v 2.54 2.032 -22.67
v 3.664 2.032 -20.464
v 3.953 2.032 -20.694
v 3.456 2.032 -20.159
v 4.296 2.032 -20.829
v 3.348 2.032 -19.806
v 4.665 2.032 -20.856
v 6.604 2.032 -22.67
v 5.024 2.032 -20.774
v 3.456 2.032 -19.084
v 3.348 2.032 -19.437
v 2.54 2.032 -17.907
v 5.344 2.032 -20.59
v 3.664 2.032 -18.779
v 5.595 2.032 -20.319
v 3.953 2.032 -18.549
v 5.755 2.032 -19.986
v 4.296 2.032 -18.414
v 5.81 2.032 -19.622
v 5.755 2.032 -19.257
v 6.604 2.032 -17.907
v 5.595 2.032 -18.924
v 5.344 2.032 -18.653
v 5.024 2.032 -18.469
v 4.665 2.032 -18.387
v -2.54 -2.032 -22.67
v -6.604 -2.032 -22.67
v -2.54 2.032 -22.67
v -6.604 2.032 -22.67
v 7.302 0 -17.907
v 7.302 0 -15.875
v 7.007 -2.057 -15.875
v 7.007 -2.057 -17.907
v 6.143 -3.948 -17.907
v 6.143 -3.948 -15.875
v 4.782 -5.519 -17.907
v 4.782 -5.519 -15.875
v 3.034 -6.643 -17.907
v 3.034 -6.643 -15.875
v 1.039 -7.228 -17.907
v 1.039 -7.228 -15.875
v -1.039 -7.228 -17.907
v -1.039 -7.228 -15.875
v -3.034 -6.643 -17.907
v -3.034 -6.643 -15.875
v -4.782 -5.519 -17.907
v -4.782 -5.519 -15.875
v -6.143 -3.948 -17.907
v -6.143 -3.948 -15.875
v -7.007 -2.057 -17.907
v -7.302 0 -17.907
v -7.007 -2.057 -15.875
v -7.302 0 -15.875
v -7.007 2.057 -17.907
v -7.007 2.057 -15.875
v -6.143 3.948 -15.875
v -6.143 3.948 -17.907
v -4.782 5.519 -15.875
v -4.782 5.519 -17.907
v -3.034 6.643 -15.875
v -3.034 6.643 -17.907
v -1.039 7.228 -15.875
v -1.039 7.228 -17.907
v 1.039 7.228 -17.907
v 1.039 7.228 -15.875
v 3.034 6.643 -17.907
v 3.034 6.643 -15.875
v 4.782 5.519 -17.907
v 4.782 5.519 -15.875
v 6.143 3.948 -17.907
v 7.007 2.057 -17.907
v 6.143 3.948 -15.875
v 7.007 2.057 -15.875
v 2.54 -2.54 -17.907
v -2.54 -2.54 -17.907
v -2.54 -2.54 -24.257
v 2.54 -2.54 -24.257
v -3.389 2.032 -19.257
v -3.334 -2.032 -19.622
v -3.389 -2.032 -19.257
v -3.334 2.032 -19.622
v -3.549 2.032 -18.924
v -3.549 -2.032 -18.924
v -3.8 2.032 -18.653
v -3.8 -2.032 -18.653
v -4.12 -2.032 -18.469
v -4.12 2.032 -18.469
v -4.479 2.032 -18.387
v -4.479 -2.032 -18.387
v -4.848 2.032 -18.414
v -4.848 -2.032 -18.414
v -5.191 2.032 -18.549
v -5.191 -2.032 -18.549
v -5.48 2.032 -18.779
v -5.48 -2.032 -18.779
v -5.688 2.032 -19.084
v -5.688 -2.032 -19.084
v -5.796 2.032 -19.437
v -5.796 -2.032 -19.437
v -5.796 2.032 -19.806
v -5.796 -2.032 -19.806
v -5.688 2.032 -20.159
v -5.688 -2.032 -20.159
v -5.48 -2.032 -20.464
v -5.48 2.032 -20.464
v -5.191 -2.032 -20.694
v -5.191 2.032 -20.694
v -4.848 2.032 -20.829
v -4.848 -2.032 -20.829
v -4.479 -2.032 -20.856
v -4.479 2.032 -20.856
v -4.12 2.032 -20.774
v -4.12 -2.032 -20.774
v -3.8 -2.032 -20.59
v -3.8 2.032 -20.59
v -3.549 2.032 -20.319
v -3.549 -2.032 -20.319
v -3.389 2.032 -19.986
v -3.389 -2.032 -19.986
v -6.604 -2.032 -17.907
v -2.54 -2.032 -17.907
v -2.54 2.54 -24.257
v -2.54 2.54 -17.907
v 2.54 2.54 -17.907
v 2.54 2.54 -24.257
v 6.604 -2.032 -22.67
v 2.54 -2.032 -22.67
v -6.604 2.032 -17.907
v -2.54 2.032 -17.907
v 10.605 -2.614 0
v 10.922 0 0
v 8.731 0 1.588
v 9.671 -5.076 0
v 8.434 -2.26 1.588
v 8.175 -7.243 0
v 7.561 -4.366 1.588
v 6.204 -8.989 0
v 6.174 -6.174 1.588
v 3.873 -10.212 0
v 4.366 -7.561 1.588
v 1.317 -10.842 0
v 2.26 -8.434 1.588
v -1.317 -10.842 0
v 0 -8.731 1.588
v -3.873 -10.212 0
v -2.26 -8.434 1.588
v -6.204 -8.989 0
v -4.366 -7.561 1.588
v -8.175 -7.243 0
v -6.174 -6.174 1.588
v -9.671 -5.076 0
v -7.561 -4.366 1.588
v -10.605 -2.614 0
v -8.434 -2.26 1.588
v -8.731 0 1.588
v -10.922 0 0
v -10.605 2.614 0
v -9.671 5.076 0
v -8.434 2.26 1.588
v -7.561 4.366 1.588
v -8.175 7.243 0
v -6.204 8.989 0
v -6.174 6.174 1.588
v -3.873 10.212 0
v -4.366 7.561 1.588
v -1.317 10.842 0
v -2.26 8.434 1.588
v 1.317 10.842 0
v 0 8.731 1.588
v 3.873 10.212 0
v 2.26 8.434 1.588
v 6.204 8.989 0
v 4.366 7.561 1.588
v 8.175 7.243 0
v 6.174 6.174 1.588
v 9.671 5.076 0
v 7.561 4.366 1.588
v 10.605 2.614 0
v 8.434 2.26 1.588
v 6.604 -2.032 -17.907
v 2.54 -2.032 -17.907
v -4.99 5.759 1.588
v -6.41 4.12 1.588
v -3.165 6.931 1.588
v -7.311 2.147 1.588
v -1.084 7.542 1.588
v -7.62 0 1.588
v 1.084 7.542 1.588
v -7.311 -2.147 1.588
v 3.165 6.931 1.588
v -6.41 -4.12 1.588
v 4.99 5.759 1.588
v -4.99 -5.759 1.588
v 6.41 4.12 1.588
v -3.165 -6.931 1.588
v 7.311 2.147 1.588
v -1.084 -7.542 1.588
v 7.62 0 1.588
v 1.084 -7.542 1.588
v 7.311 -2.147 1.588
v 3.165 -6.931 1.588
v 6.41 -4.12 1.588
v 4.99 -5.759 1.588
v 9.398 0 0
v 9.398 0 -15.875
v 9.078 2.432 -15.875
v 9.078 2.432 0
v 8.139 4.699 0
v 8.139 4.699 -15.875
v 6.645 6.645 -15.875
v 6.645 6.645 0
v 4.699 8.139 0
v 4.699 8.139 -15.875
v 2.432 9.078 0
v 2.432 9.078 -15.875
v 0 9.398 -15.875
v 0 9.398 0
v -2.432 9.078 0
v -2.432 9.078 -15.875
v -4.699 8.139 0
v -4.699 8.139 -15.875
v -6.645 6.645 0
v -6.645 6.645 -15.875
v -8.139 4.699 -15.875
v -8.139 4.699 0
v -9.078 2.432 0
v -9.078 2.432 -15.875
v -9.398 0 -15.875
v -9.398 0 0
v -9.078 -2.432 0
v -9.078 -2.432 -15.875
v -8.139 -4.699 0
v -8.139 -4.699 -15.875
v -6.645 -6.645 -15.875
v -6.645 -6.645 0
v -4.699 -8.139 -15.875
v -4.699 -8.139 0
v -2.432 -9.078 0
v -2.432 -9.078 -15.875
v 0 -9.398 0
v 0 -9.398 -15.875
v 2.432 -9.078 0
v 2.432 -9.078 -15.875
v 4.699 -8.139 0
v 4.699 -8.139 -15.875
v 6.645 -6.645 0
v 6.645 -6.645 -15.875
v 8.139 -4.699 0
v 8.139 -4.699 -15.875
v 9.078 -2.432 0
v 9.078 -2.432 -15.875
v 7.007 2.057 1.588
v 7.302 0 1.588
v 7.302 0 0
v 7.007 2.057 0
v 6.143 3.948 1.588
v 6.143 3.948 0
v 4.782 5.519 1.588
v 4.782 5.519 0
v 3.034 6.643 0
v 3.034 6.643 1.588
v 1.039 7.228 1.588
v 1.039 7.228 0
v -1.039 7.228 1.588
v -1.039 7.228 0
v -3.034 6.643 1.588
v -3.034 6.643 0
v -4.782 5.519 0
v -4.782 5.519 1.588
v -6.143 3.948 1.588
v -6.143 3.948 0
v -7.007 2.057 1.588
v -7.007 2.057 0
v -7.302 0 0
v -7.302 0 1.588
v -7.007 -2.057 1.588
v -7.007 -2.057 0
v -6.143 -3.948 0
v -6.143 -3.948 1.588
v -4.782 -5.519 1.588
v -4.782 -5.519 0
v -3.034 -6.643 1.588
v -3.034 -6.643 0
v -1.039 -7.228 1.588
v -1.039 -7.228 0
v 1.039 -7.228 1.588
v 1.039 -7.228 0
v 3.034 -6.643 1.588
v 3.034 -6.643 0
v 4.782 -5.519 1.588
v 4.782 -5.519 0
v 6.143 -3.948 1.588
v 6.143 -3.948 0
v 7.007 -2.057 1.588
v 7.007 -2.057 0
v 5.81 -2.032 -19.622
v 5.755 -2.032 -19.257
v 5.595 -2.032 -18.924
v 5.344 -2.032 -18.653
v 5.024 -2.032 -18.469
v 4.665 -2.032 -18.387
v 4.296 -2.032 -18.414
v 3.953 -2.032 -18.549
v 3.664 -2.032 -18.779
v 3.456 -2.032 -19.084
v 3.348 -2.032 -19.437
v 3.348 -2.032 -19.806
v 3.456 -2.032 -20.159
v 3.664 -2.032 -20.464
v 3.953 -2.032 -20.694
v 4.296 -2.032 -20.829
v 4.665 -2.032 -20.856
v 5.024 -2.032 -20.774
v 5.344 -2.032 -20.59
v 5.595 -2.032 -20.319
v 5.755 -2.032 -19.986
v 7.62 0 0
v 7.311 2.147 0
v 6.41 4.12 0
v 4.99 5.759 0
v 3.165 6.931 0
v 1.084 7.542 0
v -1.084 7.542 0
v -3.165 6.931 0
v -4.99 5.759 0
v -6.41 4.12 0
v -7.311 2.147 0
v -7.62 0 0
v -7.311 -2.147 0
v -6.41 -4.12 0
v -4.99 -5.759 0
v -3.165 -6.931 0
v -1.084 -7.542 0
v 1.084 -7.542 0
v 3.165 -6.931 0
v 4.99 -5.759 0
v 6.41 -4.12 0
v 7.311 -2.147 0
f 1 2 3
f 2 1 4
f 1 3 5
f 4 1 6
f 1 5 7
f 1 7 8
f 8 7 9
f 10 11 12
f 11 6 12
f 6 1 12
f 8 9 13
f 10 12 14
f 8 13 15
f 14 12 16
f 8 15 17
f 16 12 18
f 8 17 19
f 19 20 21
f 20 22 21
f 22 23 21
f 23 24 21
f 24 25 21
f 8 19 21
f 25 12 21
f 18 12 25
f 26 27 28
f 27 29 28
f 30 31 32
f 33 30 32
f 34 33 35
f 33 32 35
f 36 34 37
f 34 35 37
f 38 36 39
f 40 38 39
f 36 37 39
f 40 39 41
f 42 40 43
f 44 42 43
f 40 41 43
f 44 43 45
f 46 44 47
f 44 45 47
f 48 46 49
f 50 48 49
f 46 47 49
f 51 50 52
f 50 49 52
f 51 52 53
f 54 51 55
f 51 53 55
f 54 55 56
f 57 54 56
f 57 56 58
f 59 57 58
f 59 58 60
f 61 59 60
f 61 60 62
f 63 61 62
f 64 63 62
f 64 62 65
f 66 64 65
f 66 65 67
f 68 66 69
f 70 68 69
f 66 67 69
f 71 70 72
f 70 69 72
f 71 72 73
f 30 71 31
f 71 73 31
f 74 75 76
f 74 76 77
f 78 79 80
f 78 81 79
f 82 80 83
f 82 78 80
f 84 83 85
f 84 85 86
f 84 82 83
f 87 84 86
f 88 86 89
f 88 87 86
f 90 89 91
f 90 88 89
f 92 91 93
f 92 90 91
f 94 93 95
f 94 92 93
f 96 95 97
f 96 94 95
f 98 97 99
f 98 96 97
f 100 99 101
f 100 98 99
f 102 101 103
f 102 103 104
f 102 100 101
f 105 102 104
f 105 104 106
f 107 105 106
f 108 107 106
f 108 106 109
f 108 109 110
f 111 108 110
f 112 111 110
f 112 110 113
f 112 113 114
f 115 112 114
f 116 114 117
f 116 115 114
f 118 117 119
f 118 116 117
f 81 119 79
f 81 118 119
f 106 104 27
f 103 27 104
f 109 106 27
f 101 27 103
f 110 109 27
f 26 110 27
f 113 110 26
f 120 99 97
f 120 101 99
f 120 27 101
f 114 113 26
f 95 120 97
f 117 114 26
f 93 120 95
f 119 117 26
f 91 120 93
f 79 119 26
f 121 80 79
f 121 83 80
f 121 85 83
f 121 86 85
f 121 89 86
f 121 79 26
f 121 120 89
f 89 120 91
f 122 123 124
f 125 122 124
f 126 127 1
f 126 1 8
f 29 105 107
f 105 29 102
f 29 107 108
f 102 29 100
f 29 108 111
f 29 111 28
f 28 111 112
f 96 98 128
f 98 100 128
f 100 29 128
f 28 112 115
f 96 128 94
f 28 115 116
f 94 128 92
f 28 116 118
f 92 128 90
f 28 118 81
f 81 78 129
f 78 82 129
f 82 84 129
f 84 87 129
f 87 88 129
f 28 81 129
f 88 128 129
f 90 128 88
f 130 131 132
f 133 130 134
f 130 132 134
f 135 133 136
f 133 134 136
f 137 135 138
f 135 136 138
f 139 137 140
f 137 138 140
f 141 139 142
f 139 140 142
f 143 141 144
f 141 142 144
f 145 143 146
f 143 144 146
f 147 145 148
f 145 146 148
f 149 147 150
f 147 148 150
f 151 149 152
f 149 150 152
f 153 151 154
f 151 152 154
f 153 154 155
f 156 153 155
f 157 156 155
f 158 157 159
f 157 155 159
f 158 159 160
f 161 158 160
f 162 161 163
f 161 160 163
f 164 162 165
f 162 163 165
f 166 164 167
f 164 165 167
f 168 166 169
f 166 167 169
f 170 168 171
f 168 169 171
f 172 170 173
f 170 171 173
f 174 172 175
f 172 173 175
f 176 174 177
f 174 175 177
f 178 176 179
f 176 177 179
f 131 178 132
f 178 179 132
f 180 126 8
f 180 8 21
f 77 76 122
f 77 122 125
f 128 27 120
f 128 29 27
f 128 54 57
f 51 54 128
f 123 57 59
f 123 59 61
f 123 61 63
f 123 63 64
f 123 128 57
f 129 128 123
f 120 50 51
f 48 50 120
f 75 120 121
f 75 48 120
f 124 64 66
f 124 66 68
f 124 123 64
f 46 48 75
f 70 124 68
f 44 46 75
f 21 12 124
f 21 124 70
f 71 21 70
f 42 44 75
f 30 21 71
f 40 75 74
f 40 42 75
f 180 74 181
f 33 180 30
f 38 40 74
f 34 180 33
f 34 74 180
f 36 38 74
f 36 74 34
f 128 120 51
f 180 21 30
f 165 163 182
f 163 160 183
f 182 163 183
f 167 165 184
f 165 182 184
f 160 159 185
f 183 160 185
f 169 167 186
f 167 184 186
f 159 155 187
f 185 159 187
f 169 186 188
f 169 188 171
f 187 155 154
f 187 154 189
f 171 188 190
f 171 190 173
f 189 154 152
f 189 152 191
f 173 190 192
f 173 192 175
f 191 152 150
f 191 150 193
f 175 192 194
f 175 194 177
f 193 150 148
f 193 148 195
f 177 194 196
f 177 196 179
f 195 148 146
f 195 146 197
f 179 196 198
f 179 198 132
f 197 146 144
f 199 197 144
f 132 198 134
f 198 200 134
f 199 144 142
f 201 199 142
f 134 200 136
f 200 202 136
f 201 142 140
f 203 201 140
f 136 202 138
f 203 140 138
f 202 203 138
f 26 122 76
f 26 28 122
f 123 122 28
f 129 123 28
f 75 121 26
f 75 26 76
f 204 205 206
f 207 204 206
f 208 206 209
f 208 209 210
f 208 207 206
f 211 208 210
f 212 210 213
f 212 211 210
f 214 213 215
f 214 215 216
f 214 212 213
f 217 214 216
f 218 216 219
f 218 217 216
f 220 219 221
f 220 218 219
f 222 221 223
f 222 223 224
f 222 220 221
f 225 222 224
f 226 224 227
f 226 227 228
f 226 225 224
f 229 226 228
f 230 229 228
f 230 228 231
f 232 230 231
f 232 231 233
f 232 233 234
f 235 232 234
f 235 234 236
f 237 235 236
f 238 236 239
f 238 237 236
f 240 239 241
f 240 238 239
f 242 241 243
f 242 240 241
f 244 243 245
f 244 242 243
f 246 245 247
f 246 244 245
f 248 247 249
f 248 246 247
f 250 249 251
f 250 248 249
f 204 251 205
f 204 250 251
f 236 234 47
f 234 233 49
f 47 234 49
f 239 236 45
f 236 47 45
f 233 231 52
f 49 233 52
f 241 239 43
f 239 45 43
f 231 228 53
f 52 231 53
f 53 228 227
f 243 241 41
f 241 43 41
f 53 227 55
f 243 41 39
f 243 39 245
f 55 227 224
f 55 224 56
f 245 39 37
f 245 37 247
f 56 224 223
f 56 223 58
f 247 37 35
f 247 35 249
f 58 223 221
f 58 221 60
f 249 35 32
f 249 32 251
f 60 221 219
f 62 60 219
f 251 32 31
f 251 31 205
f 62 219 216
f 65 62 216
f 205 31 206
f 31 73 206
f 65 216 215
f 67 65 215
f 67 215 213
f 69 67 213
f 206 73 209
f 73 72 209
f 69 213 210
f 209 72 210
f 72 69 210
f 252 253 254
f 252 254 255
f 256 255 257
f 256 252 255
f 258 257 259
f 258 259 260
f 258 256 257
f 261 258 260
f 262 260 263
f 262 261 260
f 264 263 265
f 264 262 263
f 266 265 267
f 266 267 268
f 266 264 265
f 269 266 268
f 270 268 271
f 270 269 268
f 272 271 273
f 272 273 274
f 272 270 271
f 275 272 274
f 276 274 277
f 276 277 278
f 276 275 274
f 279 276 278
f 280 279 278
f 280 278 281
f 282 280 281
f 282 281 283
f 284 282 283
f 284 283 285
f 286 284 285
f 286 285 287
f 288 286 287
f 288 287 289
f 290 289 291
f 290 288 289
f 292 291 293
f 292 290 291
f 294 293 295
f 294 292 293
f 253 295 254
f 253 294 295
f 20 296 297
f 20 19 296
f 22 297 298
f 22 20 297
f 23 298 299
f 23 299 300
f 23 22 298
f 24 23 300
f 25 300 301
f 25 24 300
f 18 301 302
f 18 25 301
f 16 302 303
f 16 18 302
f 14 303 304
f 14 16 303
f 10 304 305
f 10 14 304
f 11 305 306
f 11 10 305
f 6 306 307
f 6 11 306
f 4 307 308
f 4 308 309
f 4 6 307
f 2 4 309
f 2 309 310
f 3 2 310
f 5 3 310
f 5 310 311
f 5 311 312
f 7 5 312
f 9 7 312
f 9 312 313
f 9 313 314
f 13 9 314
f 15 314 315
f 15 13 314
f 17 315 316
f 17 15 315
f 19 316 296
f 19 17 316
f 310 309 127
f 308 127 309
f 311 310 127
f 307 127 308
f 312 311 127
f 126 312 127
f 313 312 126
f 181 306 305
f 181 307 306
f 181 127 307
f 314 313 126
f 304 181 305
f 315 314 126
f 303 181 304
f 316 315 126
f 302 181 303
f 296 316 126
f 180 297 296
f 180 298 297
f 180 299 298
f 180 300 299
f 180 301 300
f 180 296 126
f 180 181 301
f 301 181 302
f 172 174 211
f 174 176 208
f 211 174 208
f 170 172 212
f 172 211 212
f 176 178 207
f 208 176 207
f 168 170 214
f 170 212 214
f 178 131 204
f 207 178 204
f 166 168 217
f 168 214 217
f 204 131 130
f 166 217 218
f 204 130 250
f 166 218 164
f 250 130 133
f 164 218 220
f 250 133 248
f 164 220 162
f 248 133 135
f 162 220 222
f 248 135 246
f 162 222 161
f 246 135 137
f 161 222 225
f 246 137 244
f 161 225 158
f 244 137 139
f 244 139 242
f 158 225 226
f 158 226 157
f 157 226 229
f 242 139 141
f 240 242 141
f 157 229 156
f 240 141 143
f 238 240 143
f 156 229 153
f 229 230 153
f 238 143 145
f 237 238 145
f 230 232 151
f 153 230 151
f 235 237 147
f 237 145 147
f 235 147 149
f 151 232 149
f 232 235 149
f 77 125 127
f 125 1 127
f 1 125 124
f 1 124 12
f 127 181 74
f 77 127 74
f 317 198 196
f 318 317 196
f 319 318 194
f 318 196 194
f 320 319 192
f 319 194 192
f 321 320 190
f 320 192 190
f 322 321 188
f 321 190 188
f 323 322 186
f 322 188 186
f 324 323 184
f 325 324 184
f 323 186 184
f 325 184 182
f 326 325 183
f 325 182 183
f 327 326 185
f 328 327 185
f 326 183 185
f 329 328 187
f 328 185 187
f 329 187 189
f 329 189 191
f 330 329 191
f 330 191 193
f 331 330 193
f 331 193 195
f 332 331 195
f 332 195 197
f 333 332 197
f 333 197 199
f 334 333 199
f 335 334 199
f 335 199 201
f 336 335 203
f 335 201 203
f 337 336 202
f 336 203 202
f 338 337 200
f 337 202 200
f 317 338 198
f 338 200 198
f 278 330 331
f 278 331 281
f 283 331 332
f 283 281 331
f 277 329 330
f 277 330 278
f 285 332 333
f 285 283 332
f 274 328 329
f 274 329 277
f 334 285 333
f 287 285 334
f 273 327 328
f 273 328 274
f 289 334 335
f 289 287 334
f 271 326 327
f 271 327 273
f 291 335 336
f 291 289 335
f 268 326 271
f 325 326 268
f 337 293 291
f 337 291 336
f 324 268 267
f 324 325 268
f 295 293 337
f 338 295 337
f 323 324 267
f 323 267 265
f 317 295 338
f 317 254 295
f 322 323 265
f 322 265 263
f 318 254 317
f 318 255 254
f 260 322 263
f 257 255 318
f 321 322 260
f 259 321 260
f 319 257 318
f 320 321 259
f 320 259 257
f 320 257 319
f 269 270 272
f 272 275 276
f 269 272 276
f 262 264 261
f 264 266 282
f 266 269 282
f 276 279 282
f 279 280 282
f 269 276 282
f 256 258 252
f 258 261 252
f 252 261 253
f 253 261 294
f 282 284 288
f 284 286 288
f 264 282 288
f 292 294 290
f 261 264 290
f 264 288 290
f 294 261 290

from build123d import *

# Parameters (mm, degrees)
F0_R      = 9.398
F1_DEPTH  = 15.875
F4_R      = 7.62
F4_R_2    = 7.3025
F5_DEPTH  = 1.5875
F6_R      = 7.3025
F7_DEPTH  = 2.032
F8_W      = 5.08
F8_H      = 5.08
F9_DEPTH  = 6.35
F10_W     = 4.064
F10_H     = 4.7625
F10_R     = 1.23825
F11_DEPTH = 2.032


with BuildPart() as f1:
    # F0 (on Top) → F1 (new body)
    with BuildSketch(Plane.XY):
        Circle(F0_R)
    extrude(amount=-F1_DEPTH)

    # F2 (on Front) → F3 (revolve)
    with BuildSketch(Plane.XZ):
        Polygon((0, 1.5875), (0, 0), (10.922, 0), (8.73125, 1.5875), align=None)
    revolve(axis=Axis((0, 0, 0.79375), (0, 0, -1)))

    # F4 (on face) → F5 (cut)
    with BuildSketch(Plane.XY.offset(1.5875)):
        Circle(F4_R)
        Circle(F4_R_2, mode=Mode.SUBTRACT)
    extrude(amount=-F5_DEPTH, mode=Mode.SUBTRACT)

    # F6 (on face) → F7 (join)
    with BuildSketch(Plane(origin=(0, 0, -15.875), x_dir=(1, 0, 0), z_dir=(0, 0, -1))):
        Circle(F6_R)
    extrude(amount=F7_DEPTH)

    # F8 (on face) → F9 (join)
    with BuildSketch(Plane(origin=(0, 0, -17.907), x_dir=(1, 0, 0), z_dir=(0, 0, -1))):
        Rectangle(F8_W, F8_H)
    extrude(amount=F9_DEPTH)

    # F10 (on Front) → F11 (join, symmetric)
    with BuildSketch(Plane.XZ):
        with Locations((-4.572, -20.28825)):
            Rectangle(F10_W, F10_H)
        with Locations((-4.572, -19.6215)):
            Circle(F10_R, mode=Mode.SUBTRACT)
        with Locations((4.572, -20.28825)):
            Rectangle(F10_W, F10_H)
        with Locations((4.572, -19.6215)):
            Circle(F10_R, mode=Mode.SUBTRACT)
    extrude(amount=F11_DEPTH, both=True)


solid = f1.part
